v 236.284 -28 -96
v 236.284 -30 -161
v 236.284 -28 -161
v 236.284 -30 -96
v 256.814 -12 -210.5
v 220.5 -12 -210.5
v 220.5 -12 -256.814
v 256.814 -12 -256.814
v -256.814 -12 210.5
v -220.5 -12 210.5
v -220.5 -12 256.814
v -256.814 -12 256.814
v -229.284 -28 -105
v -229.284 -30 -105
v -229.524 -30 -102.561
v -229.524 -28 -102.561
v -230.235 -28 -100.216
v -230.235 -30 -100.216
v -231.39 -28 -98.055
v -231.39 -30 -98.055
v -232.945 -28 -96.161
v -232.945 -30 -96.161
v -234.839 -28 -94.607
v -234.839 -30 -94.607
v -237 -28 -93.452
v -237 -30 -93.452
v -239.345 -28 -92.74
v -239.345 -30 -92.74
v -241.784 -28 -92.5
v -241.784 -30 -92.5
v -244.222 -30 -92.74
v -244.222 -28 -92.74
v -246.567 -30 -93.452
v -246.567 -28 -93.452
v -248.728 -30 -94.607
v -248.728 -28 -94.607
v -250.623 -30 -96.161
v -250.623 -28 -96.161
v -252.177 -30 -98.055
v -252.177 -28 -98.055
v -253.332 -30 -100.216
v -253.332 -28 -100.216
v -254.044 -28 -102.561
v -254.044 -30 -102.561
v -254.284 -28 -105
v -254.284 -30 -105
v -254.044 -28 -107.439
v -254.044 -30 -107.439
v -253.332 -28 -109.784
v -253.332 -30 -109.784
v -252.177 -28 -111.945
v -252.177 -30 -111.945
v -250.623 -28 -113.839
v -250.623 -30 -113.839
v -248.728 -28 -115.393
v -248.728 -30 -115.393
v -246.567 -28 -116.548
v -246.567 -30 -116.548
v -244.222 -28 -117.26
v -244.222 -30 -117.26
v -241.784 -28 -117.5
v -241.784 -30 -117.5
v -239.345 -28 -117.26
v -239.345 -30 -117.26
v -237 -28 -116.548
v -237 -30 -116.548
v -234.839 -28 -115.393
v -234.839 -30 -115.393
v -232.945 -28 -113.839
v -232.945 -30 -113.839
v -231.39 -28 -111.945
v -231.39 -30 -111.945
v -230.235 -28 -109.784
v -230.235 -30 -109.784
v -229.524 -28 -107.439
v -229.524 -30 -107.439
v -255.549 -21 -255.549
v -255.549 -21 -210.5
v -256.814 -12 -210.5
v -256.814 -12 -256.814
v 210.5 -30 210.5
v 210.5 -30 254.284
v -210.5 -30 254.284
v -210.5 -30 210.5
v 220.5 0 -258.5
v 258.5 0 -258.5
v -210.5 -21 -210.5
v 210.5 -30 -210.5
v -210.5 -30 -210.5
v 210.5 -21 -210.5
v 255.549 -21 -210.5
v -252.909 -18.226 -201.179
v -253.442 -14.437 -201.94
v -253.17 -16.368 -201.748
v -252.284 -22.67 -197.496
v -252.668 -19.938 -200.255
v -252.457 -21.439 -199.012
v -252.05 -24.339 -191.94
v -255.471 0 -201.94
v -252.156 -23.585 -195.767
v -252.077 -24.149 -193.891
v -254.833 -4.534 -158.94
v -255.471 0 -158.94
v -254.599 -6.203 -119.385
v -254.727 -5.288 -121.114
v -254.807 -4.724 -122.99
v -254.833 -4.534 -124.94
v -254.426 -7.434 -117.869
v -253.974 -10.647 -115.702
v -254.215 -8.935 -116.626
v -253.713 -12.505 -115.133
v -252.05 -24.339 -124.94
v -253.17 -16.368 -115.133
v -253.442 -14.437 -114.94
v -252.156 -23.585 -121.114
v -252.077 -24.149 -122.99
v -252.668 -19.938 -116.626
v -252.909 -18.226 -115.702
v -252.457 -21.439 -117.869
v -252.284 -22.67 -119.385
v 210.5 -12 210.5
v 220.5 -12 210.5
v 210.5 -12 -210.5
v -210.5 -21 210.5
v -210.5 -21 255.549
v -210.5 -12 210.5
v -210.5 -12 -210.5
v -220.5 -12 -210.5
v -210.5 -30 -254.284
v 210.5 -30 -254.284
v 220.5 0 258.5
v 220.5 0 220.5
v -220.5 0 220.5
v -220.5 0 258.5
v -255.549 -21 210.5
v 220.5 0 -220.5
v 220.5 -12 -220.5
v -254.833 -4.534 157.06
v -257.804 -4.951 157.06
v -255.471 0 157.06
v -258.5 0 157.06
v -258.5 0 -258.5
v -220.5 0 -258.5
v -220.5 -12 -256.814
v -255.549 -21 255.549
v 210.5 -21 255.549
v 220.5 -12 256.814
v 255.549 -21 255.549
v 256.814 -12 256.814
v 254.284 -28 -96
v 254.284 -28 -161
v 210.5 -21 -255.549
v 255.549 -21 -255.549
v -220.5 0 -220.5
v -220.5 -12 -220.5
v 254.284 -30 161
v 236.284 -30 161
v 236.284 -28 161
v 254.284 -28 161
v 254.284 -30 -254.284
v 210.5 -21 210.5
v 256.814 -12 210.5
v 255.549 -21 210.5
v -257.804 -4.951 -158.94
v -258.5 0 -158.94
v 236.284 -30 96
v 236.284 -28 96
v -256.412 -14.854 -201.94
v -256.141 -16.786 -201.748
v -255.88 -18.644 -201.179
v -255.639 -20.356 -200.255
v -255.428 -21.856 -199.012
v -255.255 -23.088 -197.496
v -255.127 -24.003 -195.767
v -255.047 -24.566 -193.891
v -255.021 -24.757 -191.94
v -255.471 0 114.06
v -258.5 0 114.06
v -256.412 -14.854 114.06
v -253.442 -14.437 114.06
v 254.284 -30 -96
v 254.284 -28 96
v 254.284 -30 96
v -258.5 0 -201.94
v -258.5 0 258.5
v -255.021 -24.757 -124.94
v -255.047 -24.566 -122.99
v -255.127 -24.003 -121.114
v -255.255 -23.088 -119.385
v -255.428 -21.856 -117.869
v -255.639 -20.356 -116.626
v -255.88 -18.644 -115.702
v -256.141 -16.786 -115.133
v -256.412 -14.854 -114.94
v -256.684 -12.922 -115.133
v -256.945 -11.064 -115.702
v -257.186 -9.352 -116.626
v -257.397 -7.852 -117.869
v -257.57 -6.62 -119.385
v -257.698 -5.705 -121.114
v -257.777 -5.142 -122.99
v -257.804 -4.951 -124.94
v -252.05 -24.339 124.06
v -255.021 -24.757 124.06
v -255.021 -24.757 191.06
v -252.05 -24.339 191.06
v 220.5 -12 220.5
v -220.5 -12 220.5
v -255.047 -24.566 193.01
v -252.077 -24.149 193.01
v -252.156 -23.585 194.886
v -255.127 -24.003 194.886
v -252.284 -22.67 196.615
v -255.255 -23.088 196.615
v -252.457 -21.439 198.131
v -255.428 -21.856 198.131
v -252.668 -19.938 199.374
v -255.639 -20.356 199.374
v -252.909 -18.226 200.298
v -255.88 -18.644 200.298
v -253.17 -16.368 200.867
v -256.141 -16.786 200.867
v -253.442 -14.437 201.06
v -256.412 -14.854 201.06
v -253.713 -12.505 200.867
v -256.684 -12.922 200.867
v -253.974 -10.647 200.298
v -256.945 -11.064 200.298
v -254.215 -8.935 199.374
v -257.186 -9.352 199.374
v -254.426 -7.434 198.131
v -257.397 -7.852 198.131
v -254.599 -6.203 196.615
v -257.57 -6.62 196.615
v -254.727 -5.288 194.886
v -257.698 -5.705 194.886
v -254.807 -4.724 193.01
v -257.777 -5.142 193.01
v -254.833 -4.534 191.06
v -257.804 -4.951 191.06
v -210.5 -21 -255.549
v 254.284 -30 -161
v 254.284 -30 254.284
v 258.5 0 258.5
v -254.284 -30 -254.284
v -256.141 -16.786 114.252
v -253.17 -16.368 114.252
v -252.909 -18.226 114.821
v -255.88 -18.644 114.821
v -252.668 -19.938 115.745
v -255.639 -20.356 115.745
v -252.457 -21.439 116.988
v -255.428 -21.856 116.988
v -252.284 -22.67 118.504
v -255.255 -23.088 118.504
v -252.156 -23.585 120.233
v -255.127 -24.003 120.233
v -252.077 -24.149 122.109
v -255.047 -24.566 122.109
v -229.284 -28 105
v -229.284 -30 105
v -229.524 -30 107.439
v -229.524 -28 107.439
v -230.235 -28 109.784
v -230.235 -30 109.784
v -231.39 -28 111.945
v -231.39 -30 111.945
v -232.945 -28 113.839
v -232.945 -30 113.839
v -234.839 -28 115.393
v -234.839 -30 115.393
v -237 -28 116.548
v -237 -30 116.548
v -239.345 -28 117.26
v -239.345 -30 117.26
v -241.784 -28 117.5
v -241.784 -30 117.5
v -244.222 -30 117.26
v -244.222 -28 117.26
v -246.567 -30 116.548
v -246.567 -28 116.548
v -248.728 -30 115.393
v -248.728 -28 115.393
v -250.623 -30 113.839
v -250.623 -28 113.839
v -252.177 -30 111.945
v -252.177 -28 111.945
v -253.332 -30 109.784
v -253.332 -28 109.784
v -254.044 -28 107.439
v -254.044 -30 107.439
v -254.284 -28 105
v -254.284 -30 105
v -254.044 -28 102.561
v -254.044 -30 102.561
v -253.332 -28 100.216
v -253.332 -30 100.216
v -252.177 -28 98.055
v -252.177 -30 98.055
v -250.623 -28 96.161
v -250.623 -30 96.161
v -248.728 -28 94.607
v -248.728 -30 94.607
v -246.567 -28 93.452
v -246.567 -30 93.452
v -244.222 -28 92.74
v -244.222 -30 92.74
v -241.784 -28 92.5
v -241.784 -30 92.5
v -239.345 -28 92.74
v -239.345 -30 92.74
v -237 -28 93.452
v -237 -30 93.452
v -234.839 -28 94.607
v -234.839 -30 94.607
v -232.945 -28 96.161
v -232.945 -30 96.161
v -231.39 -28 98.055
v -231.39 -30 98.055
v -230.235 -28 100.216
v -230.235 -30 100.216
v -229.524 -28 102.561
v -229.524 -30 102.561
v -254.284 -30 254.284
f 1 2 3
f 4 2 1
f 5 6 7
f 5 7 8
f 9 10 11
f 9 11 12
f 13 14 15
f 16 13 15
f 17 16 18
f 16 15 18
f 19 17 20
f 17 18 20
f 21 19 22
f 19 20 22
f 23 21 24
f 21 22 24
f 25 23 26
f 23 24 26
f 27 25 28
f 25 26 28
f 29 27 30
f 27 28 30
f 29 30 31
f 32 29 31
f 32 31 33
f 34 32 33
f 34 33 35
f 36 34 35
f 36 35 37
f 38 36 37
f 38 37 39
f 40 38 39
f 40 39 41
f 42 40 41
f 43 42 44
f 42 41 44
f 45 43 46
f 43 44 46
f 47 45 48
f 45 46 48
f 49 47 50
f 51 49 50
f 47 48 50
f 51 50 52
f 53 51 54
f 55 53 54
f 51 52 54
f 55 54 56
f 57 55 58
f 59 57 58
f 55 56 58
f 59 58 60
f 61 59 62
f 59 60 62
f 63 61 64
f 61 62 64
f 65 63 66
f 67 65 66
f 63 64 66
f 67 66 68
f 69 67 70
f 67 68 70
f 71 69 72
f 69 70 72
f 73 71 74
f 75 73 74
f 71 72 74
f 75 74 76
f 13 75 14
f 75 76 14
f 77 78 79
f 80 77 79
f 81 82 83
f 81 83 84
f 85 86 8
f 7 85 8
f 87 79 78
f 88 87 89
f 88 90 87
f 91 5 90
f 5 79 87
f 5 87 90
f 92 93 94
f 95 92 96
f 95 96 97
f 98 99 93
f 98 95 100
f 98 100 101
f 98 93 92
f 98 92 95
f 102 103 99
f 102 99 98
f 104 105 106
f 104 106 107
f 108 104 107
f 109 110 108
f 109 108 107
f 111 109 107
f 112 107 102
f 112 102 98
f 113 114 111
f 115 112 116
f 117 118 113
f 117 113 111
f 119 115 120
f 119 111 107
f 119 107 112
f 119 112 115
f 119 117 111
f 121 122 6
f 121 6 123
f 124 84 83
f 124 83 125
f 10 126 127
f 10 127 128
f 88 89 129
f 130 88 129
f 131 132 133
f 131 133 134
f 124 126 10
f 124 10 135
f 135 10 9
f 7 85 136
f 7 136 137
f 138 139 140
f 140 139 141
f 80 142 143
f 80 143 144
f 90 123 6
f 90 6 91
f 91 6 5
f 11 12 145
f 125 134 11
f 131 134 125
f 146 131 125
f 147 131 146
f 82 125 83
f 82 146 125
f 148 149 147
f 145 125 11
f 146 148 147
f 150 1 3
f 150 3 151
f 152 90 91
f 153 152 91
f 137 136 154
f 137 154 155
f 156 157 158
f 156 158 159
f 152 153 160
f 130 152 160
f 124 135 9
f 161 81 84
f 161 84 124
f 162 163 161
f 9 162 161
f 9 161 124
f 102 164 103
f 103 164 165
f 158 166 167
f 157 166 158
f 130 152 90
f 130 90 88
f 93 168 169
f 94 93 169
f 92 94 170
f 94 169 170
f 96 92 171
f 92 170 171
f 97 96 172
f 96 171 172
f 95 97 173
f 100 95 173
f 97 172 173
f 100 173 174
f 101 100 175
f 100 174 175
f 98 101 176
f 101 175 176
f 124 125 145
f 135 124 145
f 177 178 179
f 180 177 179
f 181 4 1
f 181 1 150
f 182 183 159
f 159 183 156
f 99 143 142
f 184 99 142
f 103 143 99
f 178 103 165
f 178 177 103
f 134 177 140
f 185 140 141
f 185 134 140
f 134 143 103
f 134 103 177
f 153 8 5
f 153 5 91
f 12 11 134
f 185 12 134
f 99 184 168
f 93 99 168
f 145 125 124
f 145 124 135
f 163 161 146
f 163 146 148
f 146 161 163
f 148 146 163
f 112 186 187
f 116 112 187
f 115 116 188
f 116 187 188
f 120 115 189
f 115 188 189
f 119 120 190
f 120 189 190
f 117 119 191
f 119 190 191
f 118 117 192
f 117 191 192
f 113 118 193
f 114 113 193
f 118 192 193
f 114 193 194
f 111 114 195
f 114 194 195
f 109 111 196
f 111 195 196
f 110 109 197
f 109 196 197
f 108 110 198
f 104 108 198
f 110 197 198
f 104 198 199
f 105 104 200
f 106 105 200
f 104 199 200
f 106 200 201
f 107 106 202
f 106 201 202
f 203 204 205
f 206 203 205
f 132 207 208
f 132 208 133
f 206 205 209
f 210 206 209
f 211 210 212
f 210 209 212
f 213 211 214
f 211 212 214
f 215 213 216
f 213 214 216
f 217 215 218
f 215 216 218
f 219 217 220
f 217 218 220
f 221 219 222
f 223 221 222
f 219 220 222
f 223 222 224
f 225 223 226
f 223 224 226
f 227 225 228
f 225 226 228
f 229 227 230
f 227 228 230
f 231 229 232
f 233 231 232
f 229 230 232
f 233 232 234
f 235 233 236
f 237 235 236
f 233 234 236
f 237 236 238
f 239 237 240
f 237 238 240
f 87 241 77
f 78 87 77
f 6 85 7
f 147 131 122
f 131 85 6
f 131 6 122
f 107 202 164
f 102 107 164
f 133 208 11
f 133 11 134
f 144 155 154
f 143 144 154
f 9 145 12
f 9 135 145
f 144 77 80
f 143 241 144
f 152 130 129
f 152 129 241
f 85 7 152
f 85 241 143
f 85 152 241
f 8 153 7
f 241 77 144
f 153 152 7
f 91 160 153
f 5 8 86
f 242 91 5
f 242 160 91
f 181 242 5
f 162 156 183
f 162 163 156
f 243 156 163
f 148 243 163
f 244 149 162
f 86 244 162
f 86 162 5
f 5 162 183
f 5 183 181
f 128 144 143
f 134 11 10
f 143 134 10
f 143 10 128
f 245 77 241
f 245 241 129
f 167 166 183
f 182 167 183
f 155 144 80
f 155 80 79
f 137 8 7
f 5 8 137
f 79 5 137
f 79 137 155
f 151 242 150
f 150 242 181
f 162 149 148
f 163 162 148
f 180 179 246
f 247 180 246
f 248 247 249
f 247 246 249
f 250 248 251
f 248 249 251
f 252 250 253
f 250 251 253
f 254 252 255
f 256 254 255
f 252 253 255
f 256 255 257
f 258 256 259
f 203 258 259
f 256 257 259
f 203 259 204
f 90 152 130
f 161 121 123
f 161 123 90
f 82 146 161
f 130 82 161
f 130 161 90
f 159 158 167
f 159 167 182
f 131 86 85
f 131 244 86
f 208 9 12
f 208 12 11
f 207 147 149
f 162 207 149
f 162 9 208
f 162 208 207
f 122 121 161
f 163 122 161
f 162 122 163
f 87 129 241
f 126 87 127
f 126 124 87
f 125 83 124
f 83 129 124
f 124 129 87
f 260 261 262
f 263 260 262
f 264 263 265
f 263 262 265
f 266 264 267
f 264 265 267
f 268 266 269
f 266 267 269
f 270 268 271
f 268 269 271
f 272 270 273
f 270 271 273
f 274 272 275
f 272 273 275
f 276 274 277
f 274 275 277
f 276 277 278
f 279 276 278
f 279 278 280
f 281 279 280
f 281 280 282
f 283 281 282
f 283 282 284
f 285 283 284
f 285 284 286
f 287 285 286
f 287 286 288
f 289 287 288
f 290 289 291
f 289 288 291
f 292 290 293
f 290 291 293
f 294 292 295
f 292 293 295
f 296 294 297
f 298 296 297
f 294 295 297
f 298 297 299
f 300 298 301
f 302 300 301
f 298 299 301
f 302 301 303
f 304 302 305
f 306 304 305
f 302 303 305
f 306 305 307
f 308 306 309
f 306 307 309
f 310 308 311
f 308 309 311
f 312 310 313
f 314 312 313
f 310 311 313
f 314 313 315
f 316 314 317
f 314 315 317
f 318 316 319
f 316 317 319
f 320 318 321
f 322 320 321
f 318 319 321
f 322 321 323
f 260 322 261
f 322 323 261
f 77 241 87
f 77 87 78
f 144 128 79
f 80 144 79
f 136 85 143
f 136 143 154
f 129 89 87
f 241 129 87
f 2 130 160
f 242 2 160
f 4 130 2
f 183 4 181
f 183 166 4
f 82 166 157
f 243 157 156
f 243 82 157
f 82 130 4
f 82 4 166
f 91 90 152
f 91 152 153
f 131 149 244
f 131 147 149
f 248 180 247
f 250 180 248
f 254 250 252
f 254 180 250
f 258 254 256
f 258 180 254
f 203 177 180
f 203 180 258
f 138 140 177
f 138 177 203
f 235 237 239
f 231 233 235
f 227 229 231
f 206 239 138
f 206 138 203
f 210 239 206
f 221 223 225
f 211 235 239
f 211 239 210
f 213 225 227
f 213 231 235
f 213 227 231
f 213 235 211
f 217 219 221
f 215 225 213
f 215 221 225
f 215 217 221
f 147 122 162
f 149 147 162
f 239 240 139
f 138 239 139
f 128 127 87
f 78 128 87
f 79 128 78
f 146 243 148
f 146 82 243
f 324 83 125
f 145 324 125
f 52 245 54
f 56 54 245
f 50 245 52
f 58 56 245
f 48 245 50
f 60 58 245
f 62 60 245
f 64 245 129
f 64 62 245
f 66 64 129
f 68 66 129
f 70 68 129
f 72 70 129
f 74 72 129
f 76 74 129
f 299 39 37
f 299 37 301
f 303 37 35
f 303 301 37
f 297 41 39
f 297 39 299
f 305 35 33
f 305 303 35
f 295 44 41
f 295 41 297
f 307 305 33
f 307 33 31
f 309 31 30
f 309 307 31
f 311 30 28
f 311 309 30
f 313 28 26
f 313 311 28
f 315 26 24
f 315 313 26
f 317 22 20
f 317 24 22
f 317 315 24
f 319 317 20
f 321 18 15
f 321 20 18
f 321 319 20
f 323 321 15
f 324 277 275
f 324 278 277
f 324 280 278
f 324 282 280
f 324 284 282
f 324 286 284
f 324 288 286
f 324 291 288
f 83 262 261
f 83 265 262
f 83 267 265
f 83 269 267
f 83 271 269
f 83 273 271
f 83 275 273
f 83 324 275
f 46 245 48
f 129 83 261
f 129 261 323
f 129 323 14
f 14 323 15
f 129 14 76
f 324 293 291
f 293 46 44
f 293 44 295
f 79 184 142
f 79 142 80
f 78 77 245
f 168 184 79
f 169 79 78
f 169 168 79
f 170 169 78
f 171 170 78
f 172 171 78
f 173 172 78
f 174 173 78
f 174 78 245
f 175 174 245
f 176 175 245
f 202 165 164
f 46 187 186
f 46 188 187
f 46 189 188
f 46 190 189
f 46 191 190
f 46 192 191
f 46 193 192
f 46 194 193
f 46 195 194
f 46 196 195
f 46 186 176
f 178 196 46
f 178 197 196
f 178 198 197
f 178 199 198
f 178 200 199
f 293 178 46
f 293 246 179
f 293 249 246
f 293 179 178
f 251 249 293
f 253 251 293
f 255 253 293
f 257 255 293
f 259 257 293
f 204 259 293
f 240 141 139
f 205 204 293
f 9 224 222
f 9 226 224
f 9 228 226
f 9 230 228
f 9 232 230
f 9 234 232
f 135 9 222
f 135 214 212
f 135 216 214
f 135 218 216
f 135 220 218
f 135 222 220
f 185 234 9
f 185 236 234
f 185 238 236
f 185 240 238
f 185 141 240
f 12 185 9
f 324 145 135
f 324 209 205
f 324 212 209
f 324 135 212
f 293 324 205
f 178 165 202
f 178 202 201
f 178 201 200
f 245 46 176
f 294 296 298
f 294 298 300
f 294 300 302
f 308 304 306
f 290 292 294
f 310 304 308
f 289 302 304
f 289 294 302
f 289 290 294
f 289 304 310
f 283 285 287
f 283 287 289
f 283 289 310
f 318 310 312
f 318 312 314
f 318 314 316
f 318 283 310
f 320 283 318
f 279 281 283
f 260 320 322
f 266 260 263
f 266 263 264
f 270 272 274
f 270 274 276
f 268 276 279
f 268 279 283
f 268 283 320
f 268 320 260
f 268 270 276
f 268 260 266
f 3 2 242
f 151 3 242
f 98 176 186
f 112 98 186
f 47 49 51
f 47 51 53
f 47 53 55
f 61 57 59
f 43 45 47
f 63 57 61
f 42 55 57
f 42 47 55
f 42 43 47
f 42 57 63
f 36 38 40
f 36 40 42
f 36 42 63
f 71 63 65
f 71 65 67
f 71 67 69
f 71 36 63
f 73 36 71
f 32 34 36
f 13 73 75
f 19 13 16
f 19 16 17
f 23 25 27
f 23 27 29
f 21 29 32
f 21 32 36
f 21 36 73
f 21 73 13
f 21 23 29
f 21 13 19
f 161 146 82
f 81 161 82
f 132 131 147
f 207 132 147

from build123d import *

# Parameters (mm, degrees)
F3_DEPTH       = 258.5
F5_DEPTH       = 258.5
F7_DEPTH       = 258.501
F7_DEPTH_BACK  = 258.501
F9_DEPTH       = 258.501
F9_DEPTH_BACK  = 258.501
F11_DEPTH      = 3
F12_W          = 18
F12_H          = 65
F13_DEPTH      = 2
F14_R          = 12.5
F15_DEPTH      = 2
F17_W          = 64.824461937
F17_H          = 59.0755194426
F18_DEPTH      = 3
F18_DEPTH_BACK = 6


with BuildPart() as f3:
    # F2 (on Top) → F3 (new body, symmetric)
    with BuildSketch(Plane.XY):
        Polygon((-258.5, 0), (-254.2837749589, -30), (-210.5, -30), (-210.5, -12), (-220.5, -12), (-220.5, 0), align=None)
    extrude(amount=F3_DEPTH, both=True)


with BuildPart() as f3b:
    # F2 (on Top) → F3, piece 2 (new body, symmetric)
    with BuildSketch(Plane.XY):
        Polygon((220.5, -12), (210.5, -12), (210.5, -30), (254.2837749589, -30), (258.5, 0), (220.5, 0), align=None)
    extrude(amount=F3_DEPTH, both=True)


with BuildPart() as f5:
    # F4 (on Right) → F5 (new body, symmetric)
    with BuildSketch(Plane.YZ):
        Polygon((0, 258.5), (-30, 254.2837749589), (-30, 210.5), (-12, 210.5), (-12, 220.5), (0, 220.5), align=None)
    extrude(amount=F5_DEPTH, both=True)


with BuildPart() as f5b:
    # F4 (on Right) → F5, piece 2 (new body, symmetric)
    with BuildSketch(Plane.YZ):
        Polygon((0, -220.5), (-12, -220.5), (-12, -210.5), (-30, -210.5), (-30, -254.2837749589), (0, -258.5), align=None)
    extrude(amount=F5_DEPTH, both=True)


with BuildPart() as f7_tool:
    # F6 (on Right) → F7 (new body, two sides)
    with BuildSketch(Plane.YZ) as f7_sk:
        Polygon((0, -295.9069610134), (24.4672827957, -261.938652347), (-48.7457476345, -251.6492319393), (-48.7457476345, -295.9069610134), align=None)
        Polygon((-47.852296514, 251.7747983055), (25.8951478905, 262.1393256993), (26.3699738853, 270.3554644987), (-47.852296514, 276.1369097592), align=None)
    extrude(amount=-F7_DEPTH)
    extrude(f7_sk.sketch, amount=F7_DEPTH_BACK)


with BuildPart() as f3_1:
    add(f3.part)

    # F7: cut by f7_tool
    add(f7_tool.part, mode=Mode.SUBTRACT)

    # F10 (on face) → F11 (cut)
    with BuildSketch(Plane(origin=(-253.4930742, -35.6261282393, 0), x_dir=(0.139173101, -0.9902680687, 0), z_dir=(-0.9902680687, -0.139173101, 0))):
        with BuildLine():
            Line((-10.9762465982, 124.059534058), (-10.9762465982, 191.059534058))
            ThreePointArc((-10.9762465982, 191.059534058), (-20.9762465982, 201.059534058), (-30.9762465982, 191.059534058))
            Line((-30.9762465982, 191.059534058), (-30.9762465982, 157.059534058))
            Line((-30.9762465982, 157.059534058), (-35.9762465982, 157.059534058))
            Line((-35.9762465982, 157.059534058), (-35.9762465982, 114.059534058))
            Line((-35.9762465982, 114.059534058), (-20.9762465982, 114.059534058))
            ThreePointArc((-20.9762465982, 114.059534058), (-13.9051787863, 116.9884662461), (-10.9762465982, 124.059534058))
        make_face()
        with BuildLine():
            ThreePointArc((-10.9762465982, -124.940465942), (-20.9762465982, -114.940465942), (-30.9762465982, -124.940465942))
            Line((-30.9762465982, -124.940465942), (-30.9762465982, -158.940465942))
            Line((-30.9762465982, -158.940465942), (-35.9762465982, -158.940465942))
            Line((-35.9762465982, -158.940465942), (-35.9762465982, -201.940465942))
            Line((-35.9762465982, -201.940465942), (-20.9762465982, -201.940465942))
            ThreePointArc((-20.9762465982, -201.940465942), (-13.9051787863, -199.0115337539), (-10.9762465982, -191.940465942))
            Line((-10.9762465982, -191.940465942), (-10.9762465982, -124.940465942))
        make_face()
    extrude(amount=-F11_DEPTH, mode=Mode.SUBTRACT)

    # F14 (on face) → F15 (cut)
    with BuildSketch(Plane.XZ.offset(30)):
        with Locations((-241.7837749589, 105)):
            Circle(F14_R)
        with Locations((-241.7837749589, -105)):
            Circle(F14_R)
    extrude(amount=-F15_DEPTH, mode=Mode.SUBTRACT)


with BuildPart() as f3b_1:
    add(f3b.part)

    # F7: cut by f7_tool
    add(f7_tool.part, mode=Mode.SUBTRACT)

    # F12 (on face) → F13 (cut)
    with BuildSketch(Plane.XZ.offset(30)):
        with Locations((245.2837749589, -128.5)):
            Rectangle(F12_W, F12_H)
        with Locations((245.2837749589, 128.5)):
            Rectangle(F12_W, F12_H)
    extrude(amount=-F13_DEPTH, mode=Mode.SUBTRACT)


with BuildPart() as f9_tool:
    # F8 (on Top) → F9 (new body, two sides)
    with BuildSketch(Plane.XY) as f9_sk:
        Polygon((260.4637017772, 13.9724641694), (251.4188319683, -50.3851286117), (300.2003759384, -48.7030035797), (300.2003759384, 13.9724641694), align=None)
        Polygon((-297.8262491496, -49.207656216), (-251.6194172175, -48.9578904026), (-261.5749153306, 21.8791594421), (-297.8262491496, 21.8791594421), align=None)
    extrude(amount=-F9_DEPTH)
    extrude(f9_sk.sketch, amount=F9_DEPTH_BACK)


with BuildPart() as f5_1:
    add(f5.part)

    # F9: cut by f9_tool
    add(f9_tool.part, mode=Mode.SUBTRACT)


with BuildPart() as f5b_1:
    add(f5b.part)

    # F9: cut by f9_tool
    add(f9_tool.part, mode=Mode.SUBTRACT)


with BuildPart() as f18:
    # F17 (on mid) → F18 (new body, two sides)
    with BuildSketch(Plane.XZ.offset(15)) as f18_sk:
        with Locations((242.9122309685, -240.0377597213)):
            Rectangle(F17_W, F17_H)
    extrude(amount=-F18_DEPTH)
    extrude(f18_sk.sketch, amount=F18_DEPTH_BACK)


with BuildPart() as f19_1:
    # F19: instance of F18
    add(f18.part.mirror(Plane.XY))


with BuildPart() as f20_1:
    # F20: instance of F18
    add(f18.part.mirror(Plane.YZ))


with BuildPart() as f20_2:
    # F20: instance of F19_1
    add(f19_1.part.mirror(Plane.YZ))


with BuildPart() as f3b_2:
    add(f3b_1.part)

    # F21: cut F18, F19_1, F20_2, F20_1
    add(f18.part, mode=Mode.SUBTRACT)
    add(f19_1.part, mode=Mode.SUBTRACT)
    add(f20_2.part, mode=Mode.SUBTRACT)
    add(f20_1.part, mode=Mode.SUBTRACT)


with BuildPart() as f3_2:
    add(f3_1.part)

    # F21: cut F18, F19_1, F20_2, F20_1
    add(f18.part, mode=Mode.SUBTRACT)
    add(f19_1.part, mode=Mode.SUBTRACT)
    add(f20_2.part, mode=Mode.SUBTRACT)
    add(f20_1.part, mode=Mode.SUBTRACT)


with BuildPart() as f5b_2:
    add(f5b_1.part)

    # F22: cut F3b, F3
    add(f3b_2.part, mode=Mode.SUBTRACT)
    add(f3_2.part, mode=Mode.SUBTRACT)


with BuildPart() as f5_2:
    add(f5_1.part)

    # F22: cut F3b, F3
    add(f3b_2.part, mode=Mode.SUBTRACT)
    add(f3_2.part, mode=Mode.SUBTRACT)


solid = Compound([f3b_2.part, f3_2.part, f5b_2.part, f5_2.part])
